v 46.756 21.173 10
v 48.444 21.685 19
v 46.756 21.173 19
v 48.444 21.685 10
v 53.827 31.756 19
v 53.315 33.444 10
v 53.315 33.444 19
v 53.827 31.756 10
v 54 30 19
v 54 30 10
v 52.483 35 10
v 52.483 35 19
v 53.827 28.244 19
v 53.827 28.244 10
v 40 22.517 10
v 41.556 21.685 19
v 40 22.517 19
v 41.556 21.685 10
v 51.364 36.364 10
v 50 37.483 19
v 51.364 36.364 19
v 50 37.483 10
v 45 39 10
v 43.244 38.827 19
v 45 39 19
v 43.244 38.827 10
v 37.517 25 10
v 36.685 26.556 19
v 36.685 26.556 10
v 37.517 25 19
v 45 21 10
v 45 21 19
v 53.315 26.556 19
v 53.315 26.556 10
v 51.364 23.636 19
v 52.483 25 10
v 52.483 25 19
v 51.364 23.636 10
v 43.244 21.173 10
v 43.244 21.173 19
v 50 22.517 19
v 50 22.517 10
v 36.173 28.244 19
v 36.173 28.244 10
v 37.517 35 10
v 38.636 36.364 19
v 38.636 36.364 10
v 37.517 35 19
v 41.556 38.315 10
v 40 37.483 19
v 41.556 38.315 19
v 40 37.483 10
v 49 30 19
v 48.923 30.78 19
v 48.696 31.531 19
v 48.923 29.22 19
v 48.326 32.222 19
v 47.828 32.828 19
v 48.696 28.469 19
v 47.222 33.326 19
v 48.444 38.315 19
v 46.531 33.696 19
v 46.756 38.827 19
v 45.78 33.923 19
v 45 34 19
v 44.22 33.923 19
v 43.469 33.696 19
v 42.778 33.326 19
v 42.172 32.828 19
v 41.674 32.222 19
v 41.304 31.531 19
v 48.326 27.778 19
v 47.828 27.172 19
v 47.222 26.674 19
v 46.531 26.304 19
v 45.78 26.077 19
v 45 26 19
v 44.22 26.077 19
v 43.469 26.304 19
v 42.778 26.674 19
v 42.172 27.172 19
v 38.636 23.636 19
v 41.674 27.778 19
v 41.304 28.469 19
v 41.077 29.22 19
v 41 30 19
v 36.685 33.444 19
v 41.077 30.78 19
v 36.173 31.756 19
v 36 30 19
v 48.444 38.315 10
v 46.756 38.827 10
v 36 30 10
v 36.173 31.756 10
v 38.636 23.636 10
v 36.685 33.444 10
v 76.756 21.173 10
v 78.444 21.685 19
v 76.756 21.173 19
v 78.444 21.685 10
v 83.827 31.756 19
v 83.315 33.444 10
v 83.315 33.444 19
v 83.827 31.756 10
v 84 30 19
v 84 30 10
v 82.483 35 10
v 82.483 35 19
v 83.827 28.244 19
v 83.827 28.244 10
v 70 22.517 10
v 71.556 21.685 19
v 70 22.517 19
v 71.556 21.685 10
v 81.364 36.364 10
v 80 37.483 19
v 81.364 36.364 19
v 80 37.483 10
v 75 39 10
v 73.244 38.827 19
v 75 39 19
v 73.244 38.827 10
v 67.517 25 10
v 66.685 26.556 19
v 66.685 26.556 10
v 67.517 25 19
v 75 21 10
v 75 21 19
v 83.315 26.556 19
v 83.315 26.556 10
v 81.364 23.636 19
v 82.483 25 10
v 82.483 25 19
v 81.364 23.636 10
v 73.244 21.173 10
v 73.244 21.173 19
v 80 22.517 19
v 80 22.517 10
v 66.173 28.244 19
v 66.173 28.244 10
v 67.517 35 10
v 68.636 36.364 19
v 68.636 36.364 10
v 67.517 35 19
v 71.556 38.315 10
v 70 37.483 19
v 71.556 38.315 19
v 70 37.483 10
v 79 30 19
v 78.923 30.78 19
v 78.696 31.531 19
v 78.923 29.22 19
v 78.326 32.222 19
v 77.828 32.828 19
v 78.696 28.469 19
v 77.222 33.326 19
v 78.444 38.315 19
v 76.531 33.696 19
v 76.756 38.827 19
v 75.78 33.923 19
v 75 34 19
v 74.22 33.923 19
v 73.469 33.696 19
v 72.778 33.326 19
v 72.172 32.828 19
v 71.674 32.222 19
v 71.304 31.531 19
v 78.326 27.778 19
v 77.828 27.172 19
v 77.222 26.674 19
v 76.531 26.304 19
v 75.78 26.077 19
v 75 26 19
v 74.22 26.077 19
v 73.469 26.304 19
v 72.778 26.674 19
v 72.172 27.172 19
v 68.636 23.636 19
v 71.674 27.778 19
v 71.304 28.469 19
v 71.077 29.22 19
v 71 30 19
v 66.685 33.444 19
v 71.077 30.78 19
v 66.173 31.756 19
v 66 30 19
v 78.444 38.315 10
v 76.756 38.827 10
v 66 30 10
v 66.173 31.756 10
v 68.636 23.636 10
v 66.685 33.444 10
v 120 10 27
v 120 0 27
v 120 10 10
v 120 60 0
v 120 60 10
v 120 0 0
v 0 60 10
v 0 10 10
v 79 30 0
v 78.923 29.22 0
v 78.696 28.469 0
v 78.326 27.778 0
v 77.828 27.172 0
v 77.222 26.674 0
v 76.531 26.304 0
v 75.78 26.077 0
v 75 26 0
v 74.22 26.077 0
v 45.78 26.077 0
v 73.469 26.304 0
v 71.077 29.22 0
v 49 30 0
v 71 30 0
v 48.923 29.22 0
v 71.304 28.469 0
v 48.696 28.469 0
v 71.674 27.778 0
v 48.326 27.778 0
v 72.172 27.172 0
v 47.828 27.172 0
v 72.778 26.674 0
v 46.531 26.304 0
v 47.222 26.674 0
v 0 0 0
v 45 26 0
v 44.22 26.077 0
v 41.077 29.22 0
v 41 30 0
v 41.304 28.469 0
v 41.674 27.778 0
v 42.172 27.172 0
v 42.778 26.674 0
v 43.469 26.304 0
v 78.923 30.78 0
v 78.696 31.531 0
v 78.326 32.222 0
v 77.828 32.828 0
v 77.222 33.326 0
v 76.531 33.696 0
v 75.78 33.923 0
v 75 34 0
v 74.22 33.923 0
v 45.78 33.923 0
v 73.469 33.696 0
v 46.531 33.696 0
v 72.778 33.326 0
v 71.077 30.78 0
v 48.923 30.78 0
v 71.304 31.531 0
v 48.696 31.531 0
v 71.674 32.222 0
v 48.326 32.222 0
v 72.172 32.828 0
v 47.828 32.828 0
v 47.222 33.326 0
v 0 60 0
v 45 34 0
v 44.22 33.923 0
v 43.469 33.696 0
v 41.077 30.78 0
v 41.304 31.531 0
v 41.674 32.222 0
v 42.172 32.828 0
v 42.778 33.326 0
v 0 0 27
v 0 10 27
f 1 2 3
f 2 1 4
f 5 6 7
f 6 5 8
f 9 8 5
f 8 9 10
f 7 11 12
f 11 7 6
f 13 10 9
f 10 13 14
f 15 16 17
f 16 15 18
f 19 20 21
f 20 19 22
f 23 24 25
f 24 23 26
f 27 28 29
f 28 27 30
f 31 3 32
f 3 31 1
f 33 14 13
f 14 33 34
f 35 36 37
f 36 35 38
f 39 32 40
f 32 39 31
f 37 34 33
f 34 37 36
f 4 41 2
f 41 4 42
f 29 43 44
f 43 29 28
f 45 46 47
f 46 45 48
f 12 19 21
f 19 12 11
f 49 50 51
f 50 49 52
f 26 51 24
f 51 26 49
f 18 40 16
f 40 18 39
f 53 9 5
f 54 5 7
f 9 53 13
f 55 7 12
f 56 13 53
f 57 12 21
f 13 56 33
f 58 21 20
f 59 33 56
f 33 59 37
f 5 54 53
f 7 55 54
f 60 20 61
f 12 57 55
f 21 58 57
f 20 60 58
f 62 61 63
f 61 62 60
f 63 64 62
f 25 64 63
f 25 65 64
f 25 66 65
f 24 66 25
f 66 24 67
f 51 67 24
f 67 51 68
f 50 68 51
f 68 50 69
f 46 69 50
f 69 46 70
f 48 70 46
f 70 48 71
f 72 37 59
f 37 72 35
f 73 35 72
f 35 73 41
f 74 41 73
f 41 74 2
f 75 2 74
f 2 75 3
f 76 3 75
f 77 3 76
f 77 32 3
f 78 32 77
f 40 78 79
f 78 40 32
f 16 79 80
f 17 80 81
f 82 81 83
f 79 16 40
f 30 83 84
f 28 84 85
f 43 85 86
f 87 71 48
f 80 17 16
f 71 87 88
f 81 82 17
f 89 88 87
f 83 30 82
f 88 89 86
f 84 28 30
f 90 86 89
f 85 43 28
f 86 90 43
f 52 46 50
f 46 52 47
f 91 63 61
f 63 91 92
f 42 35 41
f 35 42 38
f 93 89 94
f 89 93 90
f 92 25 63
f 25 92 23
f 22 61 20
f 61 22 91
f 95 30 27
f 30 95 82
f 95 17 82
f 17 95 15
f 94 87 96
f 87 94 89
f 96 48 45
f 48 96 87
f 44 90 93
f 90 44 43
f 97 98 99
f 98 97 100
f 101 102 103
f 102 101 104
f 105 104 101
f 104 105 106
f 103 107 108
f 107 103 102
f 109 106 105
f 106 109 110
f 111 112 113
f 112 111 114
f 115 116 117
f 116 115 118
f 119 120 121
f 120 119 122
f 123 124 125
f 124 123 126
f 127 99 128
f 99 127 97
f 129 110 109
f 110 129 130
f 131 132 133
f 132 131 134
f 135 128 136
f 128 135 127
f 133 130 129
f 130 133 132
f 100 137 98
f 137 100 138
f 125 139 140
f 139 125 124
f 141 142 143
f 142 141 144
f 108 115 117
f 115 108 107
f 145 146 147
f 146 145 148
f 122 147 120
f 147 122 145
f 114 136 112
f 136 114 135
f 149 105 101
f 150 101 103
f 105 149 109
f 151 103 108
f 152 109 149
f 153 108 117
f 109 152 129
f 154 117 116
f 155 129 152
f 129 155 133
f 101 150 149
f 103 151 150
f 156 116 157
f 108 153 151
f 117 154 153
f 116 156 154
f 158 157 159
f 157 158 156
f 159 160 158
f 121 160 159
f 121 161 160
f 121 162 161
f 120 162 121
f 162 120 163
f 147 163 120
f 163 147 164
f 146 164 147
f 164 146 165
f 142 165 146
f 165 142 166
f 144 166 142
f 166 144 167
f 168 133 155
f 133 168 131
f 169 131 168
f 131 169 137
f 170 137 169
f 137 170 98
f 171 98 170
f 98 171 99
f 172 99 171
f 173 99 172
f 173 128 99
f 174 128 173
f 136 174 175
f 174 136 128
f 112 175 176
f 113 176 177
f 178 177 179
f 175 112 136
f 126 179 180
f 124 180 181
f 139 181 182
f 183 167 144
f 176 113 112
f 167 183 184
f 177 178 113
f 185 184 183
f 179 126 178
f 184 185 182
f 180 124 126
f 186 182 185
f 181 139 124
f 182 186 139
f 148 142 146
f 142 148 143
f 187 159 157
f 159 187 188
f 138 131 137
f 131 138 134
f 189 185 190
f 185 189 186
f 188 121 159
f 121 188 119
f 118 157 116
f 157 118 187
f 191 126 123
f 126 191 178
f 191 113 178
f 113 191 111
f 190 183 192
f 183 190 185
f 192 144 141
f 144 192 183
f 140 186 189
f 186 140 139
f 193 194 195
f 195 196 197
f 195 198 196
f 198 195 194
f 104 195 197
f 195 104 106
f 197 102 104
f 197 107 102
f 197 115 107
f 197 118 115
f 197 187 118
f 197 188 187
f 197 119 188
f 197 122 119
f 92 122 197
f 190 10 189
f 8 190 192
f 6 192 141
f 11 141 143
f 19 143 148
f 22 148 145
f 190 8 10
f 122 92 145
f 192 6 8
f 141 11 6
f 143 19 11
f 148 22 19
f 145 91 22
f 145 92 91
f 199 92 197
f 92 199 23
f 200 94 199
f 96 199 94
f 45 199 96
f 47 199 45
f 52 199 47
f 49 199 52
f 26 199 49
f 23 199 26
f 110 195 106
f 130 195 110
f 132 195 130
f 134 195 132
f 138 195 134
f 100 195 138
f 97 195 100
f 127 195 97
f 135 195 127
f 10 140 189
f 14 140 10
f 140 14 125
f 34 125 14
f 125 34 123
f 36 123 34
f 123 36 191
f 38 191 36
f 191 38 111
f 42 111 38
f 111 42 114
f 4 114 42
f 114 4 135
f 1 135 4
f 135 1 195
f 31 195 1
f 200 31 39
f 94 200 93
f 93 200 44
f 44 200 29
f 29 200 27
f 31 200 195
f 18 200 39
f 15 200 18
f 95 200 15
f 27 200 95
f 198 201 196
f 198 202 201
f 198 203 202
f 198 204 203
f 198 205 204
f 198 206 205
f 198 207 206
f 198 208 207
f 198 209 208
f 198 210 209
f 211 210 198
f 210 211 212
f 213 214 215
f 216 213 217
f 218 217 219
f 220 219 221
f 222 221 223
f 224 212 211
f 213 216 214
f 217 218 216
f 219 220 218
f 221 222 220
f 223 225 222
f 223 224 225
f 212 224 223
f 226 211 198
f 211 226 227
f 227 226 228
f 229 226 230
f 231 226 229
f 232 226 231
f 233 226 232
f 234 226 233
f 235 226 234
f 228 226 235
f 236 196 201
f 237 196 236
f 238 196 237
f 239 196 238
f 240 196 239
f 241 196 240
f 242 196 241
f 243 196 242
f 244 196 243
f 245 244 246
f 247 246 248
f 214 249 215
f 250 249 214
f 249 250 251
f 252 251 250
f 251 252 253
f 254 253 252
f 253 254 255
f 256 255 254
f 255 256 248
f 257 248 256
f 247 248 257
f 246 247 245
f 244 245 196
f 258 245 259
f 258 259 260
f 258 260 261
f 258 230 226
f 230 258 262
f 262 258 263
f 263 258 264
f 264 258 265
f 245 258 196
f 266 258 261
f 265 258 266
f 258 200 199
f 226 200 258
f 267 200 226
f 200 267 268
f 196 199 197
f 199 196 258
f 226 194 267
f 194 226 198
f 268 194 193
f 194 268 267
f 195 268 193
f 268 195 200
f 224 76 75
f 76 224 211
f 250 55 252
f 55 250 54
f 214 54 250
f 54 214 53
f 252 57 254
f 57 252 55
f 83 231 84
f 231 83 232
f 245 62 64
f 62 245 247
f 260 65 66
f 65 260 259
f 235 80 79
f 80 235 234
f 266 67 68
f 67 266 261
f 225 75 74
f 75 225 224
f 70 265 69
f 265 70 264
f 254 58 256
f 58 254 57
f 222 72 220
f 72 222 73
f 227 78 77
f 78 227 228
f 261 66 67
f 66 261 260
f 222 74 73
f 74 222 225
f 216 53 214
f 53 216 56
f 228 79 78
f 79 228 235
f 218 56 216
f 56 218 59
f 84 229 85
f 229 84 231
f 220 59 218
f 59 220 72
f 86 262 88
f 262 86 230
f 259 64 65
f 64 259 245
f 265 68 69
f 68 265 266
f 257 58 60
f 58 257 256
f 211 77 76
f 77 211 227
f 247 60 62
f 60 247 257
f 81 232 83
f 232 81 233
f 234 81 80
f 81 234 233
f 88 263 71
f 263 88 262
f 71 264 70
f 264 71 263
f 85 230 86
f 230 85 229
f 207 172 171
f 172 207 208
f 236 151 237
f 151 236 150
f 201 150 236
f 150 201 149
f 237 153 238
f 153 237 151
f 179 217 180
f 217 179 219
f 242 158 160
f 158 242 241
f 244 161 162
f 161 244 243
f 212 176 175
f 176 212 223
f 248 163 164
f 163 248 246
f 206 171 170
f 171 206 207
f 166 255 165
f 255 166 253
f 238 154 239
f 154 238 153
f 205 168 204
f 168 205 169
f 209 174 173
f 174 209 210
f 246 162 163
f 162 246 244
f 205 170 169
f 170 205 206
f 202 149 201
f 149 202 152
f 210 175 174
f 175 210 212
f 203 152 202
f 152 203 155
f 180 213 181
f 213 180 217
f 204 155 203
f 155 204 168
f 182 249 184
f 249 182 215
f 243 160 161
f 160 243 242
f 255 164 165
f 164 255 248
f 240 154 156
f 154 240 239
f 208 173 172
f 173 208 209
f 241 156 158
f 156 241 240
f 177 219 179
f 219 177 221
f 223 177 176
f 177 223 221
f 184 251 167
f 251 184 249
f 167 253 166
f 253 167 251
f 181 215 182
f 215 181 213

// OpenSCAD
$fn = 32;

// ----------------------------------------------------------------------
// Drill jig: fence jig
// ----------------------------------------------------------------------

// --- parameters (mm) ---
plate_l = 120;            // plate length, X
plate_w = 60;             // plate width, Y
plate_t = 10;             // plate thickness
boss_d = 18;              // guide boss diameter
boss_h = 10;              // boss height above the plate
guide_d = 8;              // guide hole diameter
boss_pitch = 30;          // boss pitch
fence_h = 18;             // fence height above the plate
fence_t = 10;             // fence thickness

n_boss = 2;  // guide bosses
boss_x0 = (plate_l - (n_boss - 1) * boss_pitch) / 2;  // first boss X
boss_top = plate_t - 1 + boss_h;  // boss crown height
fence_top = plate_t - 1 + fence_h;  // fence crown height
total_h = max([fence_top, boss_top]);  // overall height

difference() {
  union() {
  cube([plate_l, plate_w, plate_t]);
  for (i = [0 : n_boss - 1])
    translate([boss_x0 + i * boss_pitch, plate_w / 2, plate_t - 1])
      cylinder(h = boss_h, d = boss_d);
  translate([0, 0, plate_t - 1]) cube([plate_l, fence_t, fence_h]);
  }
  for (i = [0 : n_boss - 1])
    translate([boss_x0 + i * boss_pitch, plate_w / 2, -1])
      cylinder(h = plate_t + boss_h, d = guide_d);
}
